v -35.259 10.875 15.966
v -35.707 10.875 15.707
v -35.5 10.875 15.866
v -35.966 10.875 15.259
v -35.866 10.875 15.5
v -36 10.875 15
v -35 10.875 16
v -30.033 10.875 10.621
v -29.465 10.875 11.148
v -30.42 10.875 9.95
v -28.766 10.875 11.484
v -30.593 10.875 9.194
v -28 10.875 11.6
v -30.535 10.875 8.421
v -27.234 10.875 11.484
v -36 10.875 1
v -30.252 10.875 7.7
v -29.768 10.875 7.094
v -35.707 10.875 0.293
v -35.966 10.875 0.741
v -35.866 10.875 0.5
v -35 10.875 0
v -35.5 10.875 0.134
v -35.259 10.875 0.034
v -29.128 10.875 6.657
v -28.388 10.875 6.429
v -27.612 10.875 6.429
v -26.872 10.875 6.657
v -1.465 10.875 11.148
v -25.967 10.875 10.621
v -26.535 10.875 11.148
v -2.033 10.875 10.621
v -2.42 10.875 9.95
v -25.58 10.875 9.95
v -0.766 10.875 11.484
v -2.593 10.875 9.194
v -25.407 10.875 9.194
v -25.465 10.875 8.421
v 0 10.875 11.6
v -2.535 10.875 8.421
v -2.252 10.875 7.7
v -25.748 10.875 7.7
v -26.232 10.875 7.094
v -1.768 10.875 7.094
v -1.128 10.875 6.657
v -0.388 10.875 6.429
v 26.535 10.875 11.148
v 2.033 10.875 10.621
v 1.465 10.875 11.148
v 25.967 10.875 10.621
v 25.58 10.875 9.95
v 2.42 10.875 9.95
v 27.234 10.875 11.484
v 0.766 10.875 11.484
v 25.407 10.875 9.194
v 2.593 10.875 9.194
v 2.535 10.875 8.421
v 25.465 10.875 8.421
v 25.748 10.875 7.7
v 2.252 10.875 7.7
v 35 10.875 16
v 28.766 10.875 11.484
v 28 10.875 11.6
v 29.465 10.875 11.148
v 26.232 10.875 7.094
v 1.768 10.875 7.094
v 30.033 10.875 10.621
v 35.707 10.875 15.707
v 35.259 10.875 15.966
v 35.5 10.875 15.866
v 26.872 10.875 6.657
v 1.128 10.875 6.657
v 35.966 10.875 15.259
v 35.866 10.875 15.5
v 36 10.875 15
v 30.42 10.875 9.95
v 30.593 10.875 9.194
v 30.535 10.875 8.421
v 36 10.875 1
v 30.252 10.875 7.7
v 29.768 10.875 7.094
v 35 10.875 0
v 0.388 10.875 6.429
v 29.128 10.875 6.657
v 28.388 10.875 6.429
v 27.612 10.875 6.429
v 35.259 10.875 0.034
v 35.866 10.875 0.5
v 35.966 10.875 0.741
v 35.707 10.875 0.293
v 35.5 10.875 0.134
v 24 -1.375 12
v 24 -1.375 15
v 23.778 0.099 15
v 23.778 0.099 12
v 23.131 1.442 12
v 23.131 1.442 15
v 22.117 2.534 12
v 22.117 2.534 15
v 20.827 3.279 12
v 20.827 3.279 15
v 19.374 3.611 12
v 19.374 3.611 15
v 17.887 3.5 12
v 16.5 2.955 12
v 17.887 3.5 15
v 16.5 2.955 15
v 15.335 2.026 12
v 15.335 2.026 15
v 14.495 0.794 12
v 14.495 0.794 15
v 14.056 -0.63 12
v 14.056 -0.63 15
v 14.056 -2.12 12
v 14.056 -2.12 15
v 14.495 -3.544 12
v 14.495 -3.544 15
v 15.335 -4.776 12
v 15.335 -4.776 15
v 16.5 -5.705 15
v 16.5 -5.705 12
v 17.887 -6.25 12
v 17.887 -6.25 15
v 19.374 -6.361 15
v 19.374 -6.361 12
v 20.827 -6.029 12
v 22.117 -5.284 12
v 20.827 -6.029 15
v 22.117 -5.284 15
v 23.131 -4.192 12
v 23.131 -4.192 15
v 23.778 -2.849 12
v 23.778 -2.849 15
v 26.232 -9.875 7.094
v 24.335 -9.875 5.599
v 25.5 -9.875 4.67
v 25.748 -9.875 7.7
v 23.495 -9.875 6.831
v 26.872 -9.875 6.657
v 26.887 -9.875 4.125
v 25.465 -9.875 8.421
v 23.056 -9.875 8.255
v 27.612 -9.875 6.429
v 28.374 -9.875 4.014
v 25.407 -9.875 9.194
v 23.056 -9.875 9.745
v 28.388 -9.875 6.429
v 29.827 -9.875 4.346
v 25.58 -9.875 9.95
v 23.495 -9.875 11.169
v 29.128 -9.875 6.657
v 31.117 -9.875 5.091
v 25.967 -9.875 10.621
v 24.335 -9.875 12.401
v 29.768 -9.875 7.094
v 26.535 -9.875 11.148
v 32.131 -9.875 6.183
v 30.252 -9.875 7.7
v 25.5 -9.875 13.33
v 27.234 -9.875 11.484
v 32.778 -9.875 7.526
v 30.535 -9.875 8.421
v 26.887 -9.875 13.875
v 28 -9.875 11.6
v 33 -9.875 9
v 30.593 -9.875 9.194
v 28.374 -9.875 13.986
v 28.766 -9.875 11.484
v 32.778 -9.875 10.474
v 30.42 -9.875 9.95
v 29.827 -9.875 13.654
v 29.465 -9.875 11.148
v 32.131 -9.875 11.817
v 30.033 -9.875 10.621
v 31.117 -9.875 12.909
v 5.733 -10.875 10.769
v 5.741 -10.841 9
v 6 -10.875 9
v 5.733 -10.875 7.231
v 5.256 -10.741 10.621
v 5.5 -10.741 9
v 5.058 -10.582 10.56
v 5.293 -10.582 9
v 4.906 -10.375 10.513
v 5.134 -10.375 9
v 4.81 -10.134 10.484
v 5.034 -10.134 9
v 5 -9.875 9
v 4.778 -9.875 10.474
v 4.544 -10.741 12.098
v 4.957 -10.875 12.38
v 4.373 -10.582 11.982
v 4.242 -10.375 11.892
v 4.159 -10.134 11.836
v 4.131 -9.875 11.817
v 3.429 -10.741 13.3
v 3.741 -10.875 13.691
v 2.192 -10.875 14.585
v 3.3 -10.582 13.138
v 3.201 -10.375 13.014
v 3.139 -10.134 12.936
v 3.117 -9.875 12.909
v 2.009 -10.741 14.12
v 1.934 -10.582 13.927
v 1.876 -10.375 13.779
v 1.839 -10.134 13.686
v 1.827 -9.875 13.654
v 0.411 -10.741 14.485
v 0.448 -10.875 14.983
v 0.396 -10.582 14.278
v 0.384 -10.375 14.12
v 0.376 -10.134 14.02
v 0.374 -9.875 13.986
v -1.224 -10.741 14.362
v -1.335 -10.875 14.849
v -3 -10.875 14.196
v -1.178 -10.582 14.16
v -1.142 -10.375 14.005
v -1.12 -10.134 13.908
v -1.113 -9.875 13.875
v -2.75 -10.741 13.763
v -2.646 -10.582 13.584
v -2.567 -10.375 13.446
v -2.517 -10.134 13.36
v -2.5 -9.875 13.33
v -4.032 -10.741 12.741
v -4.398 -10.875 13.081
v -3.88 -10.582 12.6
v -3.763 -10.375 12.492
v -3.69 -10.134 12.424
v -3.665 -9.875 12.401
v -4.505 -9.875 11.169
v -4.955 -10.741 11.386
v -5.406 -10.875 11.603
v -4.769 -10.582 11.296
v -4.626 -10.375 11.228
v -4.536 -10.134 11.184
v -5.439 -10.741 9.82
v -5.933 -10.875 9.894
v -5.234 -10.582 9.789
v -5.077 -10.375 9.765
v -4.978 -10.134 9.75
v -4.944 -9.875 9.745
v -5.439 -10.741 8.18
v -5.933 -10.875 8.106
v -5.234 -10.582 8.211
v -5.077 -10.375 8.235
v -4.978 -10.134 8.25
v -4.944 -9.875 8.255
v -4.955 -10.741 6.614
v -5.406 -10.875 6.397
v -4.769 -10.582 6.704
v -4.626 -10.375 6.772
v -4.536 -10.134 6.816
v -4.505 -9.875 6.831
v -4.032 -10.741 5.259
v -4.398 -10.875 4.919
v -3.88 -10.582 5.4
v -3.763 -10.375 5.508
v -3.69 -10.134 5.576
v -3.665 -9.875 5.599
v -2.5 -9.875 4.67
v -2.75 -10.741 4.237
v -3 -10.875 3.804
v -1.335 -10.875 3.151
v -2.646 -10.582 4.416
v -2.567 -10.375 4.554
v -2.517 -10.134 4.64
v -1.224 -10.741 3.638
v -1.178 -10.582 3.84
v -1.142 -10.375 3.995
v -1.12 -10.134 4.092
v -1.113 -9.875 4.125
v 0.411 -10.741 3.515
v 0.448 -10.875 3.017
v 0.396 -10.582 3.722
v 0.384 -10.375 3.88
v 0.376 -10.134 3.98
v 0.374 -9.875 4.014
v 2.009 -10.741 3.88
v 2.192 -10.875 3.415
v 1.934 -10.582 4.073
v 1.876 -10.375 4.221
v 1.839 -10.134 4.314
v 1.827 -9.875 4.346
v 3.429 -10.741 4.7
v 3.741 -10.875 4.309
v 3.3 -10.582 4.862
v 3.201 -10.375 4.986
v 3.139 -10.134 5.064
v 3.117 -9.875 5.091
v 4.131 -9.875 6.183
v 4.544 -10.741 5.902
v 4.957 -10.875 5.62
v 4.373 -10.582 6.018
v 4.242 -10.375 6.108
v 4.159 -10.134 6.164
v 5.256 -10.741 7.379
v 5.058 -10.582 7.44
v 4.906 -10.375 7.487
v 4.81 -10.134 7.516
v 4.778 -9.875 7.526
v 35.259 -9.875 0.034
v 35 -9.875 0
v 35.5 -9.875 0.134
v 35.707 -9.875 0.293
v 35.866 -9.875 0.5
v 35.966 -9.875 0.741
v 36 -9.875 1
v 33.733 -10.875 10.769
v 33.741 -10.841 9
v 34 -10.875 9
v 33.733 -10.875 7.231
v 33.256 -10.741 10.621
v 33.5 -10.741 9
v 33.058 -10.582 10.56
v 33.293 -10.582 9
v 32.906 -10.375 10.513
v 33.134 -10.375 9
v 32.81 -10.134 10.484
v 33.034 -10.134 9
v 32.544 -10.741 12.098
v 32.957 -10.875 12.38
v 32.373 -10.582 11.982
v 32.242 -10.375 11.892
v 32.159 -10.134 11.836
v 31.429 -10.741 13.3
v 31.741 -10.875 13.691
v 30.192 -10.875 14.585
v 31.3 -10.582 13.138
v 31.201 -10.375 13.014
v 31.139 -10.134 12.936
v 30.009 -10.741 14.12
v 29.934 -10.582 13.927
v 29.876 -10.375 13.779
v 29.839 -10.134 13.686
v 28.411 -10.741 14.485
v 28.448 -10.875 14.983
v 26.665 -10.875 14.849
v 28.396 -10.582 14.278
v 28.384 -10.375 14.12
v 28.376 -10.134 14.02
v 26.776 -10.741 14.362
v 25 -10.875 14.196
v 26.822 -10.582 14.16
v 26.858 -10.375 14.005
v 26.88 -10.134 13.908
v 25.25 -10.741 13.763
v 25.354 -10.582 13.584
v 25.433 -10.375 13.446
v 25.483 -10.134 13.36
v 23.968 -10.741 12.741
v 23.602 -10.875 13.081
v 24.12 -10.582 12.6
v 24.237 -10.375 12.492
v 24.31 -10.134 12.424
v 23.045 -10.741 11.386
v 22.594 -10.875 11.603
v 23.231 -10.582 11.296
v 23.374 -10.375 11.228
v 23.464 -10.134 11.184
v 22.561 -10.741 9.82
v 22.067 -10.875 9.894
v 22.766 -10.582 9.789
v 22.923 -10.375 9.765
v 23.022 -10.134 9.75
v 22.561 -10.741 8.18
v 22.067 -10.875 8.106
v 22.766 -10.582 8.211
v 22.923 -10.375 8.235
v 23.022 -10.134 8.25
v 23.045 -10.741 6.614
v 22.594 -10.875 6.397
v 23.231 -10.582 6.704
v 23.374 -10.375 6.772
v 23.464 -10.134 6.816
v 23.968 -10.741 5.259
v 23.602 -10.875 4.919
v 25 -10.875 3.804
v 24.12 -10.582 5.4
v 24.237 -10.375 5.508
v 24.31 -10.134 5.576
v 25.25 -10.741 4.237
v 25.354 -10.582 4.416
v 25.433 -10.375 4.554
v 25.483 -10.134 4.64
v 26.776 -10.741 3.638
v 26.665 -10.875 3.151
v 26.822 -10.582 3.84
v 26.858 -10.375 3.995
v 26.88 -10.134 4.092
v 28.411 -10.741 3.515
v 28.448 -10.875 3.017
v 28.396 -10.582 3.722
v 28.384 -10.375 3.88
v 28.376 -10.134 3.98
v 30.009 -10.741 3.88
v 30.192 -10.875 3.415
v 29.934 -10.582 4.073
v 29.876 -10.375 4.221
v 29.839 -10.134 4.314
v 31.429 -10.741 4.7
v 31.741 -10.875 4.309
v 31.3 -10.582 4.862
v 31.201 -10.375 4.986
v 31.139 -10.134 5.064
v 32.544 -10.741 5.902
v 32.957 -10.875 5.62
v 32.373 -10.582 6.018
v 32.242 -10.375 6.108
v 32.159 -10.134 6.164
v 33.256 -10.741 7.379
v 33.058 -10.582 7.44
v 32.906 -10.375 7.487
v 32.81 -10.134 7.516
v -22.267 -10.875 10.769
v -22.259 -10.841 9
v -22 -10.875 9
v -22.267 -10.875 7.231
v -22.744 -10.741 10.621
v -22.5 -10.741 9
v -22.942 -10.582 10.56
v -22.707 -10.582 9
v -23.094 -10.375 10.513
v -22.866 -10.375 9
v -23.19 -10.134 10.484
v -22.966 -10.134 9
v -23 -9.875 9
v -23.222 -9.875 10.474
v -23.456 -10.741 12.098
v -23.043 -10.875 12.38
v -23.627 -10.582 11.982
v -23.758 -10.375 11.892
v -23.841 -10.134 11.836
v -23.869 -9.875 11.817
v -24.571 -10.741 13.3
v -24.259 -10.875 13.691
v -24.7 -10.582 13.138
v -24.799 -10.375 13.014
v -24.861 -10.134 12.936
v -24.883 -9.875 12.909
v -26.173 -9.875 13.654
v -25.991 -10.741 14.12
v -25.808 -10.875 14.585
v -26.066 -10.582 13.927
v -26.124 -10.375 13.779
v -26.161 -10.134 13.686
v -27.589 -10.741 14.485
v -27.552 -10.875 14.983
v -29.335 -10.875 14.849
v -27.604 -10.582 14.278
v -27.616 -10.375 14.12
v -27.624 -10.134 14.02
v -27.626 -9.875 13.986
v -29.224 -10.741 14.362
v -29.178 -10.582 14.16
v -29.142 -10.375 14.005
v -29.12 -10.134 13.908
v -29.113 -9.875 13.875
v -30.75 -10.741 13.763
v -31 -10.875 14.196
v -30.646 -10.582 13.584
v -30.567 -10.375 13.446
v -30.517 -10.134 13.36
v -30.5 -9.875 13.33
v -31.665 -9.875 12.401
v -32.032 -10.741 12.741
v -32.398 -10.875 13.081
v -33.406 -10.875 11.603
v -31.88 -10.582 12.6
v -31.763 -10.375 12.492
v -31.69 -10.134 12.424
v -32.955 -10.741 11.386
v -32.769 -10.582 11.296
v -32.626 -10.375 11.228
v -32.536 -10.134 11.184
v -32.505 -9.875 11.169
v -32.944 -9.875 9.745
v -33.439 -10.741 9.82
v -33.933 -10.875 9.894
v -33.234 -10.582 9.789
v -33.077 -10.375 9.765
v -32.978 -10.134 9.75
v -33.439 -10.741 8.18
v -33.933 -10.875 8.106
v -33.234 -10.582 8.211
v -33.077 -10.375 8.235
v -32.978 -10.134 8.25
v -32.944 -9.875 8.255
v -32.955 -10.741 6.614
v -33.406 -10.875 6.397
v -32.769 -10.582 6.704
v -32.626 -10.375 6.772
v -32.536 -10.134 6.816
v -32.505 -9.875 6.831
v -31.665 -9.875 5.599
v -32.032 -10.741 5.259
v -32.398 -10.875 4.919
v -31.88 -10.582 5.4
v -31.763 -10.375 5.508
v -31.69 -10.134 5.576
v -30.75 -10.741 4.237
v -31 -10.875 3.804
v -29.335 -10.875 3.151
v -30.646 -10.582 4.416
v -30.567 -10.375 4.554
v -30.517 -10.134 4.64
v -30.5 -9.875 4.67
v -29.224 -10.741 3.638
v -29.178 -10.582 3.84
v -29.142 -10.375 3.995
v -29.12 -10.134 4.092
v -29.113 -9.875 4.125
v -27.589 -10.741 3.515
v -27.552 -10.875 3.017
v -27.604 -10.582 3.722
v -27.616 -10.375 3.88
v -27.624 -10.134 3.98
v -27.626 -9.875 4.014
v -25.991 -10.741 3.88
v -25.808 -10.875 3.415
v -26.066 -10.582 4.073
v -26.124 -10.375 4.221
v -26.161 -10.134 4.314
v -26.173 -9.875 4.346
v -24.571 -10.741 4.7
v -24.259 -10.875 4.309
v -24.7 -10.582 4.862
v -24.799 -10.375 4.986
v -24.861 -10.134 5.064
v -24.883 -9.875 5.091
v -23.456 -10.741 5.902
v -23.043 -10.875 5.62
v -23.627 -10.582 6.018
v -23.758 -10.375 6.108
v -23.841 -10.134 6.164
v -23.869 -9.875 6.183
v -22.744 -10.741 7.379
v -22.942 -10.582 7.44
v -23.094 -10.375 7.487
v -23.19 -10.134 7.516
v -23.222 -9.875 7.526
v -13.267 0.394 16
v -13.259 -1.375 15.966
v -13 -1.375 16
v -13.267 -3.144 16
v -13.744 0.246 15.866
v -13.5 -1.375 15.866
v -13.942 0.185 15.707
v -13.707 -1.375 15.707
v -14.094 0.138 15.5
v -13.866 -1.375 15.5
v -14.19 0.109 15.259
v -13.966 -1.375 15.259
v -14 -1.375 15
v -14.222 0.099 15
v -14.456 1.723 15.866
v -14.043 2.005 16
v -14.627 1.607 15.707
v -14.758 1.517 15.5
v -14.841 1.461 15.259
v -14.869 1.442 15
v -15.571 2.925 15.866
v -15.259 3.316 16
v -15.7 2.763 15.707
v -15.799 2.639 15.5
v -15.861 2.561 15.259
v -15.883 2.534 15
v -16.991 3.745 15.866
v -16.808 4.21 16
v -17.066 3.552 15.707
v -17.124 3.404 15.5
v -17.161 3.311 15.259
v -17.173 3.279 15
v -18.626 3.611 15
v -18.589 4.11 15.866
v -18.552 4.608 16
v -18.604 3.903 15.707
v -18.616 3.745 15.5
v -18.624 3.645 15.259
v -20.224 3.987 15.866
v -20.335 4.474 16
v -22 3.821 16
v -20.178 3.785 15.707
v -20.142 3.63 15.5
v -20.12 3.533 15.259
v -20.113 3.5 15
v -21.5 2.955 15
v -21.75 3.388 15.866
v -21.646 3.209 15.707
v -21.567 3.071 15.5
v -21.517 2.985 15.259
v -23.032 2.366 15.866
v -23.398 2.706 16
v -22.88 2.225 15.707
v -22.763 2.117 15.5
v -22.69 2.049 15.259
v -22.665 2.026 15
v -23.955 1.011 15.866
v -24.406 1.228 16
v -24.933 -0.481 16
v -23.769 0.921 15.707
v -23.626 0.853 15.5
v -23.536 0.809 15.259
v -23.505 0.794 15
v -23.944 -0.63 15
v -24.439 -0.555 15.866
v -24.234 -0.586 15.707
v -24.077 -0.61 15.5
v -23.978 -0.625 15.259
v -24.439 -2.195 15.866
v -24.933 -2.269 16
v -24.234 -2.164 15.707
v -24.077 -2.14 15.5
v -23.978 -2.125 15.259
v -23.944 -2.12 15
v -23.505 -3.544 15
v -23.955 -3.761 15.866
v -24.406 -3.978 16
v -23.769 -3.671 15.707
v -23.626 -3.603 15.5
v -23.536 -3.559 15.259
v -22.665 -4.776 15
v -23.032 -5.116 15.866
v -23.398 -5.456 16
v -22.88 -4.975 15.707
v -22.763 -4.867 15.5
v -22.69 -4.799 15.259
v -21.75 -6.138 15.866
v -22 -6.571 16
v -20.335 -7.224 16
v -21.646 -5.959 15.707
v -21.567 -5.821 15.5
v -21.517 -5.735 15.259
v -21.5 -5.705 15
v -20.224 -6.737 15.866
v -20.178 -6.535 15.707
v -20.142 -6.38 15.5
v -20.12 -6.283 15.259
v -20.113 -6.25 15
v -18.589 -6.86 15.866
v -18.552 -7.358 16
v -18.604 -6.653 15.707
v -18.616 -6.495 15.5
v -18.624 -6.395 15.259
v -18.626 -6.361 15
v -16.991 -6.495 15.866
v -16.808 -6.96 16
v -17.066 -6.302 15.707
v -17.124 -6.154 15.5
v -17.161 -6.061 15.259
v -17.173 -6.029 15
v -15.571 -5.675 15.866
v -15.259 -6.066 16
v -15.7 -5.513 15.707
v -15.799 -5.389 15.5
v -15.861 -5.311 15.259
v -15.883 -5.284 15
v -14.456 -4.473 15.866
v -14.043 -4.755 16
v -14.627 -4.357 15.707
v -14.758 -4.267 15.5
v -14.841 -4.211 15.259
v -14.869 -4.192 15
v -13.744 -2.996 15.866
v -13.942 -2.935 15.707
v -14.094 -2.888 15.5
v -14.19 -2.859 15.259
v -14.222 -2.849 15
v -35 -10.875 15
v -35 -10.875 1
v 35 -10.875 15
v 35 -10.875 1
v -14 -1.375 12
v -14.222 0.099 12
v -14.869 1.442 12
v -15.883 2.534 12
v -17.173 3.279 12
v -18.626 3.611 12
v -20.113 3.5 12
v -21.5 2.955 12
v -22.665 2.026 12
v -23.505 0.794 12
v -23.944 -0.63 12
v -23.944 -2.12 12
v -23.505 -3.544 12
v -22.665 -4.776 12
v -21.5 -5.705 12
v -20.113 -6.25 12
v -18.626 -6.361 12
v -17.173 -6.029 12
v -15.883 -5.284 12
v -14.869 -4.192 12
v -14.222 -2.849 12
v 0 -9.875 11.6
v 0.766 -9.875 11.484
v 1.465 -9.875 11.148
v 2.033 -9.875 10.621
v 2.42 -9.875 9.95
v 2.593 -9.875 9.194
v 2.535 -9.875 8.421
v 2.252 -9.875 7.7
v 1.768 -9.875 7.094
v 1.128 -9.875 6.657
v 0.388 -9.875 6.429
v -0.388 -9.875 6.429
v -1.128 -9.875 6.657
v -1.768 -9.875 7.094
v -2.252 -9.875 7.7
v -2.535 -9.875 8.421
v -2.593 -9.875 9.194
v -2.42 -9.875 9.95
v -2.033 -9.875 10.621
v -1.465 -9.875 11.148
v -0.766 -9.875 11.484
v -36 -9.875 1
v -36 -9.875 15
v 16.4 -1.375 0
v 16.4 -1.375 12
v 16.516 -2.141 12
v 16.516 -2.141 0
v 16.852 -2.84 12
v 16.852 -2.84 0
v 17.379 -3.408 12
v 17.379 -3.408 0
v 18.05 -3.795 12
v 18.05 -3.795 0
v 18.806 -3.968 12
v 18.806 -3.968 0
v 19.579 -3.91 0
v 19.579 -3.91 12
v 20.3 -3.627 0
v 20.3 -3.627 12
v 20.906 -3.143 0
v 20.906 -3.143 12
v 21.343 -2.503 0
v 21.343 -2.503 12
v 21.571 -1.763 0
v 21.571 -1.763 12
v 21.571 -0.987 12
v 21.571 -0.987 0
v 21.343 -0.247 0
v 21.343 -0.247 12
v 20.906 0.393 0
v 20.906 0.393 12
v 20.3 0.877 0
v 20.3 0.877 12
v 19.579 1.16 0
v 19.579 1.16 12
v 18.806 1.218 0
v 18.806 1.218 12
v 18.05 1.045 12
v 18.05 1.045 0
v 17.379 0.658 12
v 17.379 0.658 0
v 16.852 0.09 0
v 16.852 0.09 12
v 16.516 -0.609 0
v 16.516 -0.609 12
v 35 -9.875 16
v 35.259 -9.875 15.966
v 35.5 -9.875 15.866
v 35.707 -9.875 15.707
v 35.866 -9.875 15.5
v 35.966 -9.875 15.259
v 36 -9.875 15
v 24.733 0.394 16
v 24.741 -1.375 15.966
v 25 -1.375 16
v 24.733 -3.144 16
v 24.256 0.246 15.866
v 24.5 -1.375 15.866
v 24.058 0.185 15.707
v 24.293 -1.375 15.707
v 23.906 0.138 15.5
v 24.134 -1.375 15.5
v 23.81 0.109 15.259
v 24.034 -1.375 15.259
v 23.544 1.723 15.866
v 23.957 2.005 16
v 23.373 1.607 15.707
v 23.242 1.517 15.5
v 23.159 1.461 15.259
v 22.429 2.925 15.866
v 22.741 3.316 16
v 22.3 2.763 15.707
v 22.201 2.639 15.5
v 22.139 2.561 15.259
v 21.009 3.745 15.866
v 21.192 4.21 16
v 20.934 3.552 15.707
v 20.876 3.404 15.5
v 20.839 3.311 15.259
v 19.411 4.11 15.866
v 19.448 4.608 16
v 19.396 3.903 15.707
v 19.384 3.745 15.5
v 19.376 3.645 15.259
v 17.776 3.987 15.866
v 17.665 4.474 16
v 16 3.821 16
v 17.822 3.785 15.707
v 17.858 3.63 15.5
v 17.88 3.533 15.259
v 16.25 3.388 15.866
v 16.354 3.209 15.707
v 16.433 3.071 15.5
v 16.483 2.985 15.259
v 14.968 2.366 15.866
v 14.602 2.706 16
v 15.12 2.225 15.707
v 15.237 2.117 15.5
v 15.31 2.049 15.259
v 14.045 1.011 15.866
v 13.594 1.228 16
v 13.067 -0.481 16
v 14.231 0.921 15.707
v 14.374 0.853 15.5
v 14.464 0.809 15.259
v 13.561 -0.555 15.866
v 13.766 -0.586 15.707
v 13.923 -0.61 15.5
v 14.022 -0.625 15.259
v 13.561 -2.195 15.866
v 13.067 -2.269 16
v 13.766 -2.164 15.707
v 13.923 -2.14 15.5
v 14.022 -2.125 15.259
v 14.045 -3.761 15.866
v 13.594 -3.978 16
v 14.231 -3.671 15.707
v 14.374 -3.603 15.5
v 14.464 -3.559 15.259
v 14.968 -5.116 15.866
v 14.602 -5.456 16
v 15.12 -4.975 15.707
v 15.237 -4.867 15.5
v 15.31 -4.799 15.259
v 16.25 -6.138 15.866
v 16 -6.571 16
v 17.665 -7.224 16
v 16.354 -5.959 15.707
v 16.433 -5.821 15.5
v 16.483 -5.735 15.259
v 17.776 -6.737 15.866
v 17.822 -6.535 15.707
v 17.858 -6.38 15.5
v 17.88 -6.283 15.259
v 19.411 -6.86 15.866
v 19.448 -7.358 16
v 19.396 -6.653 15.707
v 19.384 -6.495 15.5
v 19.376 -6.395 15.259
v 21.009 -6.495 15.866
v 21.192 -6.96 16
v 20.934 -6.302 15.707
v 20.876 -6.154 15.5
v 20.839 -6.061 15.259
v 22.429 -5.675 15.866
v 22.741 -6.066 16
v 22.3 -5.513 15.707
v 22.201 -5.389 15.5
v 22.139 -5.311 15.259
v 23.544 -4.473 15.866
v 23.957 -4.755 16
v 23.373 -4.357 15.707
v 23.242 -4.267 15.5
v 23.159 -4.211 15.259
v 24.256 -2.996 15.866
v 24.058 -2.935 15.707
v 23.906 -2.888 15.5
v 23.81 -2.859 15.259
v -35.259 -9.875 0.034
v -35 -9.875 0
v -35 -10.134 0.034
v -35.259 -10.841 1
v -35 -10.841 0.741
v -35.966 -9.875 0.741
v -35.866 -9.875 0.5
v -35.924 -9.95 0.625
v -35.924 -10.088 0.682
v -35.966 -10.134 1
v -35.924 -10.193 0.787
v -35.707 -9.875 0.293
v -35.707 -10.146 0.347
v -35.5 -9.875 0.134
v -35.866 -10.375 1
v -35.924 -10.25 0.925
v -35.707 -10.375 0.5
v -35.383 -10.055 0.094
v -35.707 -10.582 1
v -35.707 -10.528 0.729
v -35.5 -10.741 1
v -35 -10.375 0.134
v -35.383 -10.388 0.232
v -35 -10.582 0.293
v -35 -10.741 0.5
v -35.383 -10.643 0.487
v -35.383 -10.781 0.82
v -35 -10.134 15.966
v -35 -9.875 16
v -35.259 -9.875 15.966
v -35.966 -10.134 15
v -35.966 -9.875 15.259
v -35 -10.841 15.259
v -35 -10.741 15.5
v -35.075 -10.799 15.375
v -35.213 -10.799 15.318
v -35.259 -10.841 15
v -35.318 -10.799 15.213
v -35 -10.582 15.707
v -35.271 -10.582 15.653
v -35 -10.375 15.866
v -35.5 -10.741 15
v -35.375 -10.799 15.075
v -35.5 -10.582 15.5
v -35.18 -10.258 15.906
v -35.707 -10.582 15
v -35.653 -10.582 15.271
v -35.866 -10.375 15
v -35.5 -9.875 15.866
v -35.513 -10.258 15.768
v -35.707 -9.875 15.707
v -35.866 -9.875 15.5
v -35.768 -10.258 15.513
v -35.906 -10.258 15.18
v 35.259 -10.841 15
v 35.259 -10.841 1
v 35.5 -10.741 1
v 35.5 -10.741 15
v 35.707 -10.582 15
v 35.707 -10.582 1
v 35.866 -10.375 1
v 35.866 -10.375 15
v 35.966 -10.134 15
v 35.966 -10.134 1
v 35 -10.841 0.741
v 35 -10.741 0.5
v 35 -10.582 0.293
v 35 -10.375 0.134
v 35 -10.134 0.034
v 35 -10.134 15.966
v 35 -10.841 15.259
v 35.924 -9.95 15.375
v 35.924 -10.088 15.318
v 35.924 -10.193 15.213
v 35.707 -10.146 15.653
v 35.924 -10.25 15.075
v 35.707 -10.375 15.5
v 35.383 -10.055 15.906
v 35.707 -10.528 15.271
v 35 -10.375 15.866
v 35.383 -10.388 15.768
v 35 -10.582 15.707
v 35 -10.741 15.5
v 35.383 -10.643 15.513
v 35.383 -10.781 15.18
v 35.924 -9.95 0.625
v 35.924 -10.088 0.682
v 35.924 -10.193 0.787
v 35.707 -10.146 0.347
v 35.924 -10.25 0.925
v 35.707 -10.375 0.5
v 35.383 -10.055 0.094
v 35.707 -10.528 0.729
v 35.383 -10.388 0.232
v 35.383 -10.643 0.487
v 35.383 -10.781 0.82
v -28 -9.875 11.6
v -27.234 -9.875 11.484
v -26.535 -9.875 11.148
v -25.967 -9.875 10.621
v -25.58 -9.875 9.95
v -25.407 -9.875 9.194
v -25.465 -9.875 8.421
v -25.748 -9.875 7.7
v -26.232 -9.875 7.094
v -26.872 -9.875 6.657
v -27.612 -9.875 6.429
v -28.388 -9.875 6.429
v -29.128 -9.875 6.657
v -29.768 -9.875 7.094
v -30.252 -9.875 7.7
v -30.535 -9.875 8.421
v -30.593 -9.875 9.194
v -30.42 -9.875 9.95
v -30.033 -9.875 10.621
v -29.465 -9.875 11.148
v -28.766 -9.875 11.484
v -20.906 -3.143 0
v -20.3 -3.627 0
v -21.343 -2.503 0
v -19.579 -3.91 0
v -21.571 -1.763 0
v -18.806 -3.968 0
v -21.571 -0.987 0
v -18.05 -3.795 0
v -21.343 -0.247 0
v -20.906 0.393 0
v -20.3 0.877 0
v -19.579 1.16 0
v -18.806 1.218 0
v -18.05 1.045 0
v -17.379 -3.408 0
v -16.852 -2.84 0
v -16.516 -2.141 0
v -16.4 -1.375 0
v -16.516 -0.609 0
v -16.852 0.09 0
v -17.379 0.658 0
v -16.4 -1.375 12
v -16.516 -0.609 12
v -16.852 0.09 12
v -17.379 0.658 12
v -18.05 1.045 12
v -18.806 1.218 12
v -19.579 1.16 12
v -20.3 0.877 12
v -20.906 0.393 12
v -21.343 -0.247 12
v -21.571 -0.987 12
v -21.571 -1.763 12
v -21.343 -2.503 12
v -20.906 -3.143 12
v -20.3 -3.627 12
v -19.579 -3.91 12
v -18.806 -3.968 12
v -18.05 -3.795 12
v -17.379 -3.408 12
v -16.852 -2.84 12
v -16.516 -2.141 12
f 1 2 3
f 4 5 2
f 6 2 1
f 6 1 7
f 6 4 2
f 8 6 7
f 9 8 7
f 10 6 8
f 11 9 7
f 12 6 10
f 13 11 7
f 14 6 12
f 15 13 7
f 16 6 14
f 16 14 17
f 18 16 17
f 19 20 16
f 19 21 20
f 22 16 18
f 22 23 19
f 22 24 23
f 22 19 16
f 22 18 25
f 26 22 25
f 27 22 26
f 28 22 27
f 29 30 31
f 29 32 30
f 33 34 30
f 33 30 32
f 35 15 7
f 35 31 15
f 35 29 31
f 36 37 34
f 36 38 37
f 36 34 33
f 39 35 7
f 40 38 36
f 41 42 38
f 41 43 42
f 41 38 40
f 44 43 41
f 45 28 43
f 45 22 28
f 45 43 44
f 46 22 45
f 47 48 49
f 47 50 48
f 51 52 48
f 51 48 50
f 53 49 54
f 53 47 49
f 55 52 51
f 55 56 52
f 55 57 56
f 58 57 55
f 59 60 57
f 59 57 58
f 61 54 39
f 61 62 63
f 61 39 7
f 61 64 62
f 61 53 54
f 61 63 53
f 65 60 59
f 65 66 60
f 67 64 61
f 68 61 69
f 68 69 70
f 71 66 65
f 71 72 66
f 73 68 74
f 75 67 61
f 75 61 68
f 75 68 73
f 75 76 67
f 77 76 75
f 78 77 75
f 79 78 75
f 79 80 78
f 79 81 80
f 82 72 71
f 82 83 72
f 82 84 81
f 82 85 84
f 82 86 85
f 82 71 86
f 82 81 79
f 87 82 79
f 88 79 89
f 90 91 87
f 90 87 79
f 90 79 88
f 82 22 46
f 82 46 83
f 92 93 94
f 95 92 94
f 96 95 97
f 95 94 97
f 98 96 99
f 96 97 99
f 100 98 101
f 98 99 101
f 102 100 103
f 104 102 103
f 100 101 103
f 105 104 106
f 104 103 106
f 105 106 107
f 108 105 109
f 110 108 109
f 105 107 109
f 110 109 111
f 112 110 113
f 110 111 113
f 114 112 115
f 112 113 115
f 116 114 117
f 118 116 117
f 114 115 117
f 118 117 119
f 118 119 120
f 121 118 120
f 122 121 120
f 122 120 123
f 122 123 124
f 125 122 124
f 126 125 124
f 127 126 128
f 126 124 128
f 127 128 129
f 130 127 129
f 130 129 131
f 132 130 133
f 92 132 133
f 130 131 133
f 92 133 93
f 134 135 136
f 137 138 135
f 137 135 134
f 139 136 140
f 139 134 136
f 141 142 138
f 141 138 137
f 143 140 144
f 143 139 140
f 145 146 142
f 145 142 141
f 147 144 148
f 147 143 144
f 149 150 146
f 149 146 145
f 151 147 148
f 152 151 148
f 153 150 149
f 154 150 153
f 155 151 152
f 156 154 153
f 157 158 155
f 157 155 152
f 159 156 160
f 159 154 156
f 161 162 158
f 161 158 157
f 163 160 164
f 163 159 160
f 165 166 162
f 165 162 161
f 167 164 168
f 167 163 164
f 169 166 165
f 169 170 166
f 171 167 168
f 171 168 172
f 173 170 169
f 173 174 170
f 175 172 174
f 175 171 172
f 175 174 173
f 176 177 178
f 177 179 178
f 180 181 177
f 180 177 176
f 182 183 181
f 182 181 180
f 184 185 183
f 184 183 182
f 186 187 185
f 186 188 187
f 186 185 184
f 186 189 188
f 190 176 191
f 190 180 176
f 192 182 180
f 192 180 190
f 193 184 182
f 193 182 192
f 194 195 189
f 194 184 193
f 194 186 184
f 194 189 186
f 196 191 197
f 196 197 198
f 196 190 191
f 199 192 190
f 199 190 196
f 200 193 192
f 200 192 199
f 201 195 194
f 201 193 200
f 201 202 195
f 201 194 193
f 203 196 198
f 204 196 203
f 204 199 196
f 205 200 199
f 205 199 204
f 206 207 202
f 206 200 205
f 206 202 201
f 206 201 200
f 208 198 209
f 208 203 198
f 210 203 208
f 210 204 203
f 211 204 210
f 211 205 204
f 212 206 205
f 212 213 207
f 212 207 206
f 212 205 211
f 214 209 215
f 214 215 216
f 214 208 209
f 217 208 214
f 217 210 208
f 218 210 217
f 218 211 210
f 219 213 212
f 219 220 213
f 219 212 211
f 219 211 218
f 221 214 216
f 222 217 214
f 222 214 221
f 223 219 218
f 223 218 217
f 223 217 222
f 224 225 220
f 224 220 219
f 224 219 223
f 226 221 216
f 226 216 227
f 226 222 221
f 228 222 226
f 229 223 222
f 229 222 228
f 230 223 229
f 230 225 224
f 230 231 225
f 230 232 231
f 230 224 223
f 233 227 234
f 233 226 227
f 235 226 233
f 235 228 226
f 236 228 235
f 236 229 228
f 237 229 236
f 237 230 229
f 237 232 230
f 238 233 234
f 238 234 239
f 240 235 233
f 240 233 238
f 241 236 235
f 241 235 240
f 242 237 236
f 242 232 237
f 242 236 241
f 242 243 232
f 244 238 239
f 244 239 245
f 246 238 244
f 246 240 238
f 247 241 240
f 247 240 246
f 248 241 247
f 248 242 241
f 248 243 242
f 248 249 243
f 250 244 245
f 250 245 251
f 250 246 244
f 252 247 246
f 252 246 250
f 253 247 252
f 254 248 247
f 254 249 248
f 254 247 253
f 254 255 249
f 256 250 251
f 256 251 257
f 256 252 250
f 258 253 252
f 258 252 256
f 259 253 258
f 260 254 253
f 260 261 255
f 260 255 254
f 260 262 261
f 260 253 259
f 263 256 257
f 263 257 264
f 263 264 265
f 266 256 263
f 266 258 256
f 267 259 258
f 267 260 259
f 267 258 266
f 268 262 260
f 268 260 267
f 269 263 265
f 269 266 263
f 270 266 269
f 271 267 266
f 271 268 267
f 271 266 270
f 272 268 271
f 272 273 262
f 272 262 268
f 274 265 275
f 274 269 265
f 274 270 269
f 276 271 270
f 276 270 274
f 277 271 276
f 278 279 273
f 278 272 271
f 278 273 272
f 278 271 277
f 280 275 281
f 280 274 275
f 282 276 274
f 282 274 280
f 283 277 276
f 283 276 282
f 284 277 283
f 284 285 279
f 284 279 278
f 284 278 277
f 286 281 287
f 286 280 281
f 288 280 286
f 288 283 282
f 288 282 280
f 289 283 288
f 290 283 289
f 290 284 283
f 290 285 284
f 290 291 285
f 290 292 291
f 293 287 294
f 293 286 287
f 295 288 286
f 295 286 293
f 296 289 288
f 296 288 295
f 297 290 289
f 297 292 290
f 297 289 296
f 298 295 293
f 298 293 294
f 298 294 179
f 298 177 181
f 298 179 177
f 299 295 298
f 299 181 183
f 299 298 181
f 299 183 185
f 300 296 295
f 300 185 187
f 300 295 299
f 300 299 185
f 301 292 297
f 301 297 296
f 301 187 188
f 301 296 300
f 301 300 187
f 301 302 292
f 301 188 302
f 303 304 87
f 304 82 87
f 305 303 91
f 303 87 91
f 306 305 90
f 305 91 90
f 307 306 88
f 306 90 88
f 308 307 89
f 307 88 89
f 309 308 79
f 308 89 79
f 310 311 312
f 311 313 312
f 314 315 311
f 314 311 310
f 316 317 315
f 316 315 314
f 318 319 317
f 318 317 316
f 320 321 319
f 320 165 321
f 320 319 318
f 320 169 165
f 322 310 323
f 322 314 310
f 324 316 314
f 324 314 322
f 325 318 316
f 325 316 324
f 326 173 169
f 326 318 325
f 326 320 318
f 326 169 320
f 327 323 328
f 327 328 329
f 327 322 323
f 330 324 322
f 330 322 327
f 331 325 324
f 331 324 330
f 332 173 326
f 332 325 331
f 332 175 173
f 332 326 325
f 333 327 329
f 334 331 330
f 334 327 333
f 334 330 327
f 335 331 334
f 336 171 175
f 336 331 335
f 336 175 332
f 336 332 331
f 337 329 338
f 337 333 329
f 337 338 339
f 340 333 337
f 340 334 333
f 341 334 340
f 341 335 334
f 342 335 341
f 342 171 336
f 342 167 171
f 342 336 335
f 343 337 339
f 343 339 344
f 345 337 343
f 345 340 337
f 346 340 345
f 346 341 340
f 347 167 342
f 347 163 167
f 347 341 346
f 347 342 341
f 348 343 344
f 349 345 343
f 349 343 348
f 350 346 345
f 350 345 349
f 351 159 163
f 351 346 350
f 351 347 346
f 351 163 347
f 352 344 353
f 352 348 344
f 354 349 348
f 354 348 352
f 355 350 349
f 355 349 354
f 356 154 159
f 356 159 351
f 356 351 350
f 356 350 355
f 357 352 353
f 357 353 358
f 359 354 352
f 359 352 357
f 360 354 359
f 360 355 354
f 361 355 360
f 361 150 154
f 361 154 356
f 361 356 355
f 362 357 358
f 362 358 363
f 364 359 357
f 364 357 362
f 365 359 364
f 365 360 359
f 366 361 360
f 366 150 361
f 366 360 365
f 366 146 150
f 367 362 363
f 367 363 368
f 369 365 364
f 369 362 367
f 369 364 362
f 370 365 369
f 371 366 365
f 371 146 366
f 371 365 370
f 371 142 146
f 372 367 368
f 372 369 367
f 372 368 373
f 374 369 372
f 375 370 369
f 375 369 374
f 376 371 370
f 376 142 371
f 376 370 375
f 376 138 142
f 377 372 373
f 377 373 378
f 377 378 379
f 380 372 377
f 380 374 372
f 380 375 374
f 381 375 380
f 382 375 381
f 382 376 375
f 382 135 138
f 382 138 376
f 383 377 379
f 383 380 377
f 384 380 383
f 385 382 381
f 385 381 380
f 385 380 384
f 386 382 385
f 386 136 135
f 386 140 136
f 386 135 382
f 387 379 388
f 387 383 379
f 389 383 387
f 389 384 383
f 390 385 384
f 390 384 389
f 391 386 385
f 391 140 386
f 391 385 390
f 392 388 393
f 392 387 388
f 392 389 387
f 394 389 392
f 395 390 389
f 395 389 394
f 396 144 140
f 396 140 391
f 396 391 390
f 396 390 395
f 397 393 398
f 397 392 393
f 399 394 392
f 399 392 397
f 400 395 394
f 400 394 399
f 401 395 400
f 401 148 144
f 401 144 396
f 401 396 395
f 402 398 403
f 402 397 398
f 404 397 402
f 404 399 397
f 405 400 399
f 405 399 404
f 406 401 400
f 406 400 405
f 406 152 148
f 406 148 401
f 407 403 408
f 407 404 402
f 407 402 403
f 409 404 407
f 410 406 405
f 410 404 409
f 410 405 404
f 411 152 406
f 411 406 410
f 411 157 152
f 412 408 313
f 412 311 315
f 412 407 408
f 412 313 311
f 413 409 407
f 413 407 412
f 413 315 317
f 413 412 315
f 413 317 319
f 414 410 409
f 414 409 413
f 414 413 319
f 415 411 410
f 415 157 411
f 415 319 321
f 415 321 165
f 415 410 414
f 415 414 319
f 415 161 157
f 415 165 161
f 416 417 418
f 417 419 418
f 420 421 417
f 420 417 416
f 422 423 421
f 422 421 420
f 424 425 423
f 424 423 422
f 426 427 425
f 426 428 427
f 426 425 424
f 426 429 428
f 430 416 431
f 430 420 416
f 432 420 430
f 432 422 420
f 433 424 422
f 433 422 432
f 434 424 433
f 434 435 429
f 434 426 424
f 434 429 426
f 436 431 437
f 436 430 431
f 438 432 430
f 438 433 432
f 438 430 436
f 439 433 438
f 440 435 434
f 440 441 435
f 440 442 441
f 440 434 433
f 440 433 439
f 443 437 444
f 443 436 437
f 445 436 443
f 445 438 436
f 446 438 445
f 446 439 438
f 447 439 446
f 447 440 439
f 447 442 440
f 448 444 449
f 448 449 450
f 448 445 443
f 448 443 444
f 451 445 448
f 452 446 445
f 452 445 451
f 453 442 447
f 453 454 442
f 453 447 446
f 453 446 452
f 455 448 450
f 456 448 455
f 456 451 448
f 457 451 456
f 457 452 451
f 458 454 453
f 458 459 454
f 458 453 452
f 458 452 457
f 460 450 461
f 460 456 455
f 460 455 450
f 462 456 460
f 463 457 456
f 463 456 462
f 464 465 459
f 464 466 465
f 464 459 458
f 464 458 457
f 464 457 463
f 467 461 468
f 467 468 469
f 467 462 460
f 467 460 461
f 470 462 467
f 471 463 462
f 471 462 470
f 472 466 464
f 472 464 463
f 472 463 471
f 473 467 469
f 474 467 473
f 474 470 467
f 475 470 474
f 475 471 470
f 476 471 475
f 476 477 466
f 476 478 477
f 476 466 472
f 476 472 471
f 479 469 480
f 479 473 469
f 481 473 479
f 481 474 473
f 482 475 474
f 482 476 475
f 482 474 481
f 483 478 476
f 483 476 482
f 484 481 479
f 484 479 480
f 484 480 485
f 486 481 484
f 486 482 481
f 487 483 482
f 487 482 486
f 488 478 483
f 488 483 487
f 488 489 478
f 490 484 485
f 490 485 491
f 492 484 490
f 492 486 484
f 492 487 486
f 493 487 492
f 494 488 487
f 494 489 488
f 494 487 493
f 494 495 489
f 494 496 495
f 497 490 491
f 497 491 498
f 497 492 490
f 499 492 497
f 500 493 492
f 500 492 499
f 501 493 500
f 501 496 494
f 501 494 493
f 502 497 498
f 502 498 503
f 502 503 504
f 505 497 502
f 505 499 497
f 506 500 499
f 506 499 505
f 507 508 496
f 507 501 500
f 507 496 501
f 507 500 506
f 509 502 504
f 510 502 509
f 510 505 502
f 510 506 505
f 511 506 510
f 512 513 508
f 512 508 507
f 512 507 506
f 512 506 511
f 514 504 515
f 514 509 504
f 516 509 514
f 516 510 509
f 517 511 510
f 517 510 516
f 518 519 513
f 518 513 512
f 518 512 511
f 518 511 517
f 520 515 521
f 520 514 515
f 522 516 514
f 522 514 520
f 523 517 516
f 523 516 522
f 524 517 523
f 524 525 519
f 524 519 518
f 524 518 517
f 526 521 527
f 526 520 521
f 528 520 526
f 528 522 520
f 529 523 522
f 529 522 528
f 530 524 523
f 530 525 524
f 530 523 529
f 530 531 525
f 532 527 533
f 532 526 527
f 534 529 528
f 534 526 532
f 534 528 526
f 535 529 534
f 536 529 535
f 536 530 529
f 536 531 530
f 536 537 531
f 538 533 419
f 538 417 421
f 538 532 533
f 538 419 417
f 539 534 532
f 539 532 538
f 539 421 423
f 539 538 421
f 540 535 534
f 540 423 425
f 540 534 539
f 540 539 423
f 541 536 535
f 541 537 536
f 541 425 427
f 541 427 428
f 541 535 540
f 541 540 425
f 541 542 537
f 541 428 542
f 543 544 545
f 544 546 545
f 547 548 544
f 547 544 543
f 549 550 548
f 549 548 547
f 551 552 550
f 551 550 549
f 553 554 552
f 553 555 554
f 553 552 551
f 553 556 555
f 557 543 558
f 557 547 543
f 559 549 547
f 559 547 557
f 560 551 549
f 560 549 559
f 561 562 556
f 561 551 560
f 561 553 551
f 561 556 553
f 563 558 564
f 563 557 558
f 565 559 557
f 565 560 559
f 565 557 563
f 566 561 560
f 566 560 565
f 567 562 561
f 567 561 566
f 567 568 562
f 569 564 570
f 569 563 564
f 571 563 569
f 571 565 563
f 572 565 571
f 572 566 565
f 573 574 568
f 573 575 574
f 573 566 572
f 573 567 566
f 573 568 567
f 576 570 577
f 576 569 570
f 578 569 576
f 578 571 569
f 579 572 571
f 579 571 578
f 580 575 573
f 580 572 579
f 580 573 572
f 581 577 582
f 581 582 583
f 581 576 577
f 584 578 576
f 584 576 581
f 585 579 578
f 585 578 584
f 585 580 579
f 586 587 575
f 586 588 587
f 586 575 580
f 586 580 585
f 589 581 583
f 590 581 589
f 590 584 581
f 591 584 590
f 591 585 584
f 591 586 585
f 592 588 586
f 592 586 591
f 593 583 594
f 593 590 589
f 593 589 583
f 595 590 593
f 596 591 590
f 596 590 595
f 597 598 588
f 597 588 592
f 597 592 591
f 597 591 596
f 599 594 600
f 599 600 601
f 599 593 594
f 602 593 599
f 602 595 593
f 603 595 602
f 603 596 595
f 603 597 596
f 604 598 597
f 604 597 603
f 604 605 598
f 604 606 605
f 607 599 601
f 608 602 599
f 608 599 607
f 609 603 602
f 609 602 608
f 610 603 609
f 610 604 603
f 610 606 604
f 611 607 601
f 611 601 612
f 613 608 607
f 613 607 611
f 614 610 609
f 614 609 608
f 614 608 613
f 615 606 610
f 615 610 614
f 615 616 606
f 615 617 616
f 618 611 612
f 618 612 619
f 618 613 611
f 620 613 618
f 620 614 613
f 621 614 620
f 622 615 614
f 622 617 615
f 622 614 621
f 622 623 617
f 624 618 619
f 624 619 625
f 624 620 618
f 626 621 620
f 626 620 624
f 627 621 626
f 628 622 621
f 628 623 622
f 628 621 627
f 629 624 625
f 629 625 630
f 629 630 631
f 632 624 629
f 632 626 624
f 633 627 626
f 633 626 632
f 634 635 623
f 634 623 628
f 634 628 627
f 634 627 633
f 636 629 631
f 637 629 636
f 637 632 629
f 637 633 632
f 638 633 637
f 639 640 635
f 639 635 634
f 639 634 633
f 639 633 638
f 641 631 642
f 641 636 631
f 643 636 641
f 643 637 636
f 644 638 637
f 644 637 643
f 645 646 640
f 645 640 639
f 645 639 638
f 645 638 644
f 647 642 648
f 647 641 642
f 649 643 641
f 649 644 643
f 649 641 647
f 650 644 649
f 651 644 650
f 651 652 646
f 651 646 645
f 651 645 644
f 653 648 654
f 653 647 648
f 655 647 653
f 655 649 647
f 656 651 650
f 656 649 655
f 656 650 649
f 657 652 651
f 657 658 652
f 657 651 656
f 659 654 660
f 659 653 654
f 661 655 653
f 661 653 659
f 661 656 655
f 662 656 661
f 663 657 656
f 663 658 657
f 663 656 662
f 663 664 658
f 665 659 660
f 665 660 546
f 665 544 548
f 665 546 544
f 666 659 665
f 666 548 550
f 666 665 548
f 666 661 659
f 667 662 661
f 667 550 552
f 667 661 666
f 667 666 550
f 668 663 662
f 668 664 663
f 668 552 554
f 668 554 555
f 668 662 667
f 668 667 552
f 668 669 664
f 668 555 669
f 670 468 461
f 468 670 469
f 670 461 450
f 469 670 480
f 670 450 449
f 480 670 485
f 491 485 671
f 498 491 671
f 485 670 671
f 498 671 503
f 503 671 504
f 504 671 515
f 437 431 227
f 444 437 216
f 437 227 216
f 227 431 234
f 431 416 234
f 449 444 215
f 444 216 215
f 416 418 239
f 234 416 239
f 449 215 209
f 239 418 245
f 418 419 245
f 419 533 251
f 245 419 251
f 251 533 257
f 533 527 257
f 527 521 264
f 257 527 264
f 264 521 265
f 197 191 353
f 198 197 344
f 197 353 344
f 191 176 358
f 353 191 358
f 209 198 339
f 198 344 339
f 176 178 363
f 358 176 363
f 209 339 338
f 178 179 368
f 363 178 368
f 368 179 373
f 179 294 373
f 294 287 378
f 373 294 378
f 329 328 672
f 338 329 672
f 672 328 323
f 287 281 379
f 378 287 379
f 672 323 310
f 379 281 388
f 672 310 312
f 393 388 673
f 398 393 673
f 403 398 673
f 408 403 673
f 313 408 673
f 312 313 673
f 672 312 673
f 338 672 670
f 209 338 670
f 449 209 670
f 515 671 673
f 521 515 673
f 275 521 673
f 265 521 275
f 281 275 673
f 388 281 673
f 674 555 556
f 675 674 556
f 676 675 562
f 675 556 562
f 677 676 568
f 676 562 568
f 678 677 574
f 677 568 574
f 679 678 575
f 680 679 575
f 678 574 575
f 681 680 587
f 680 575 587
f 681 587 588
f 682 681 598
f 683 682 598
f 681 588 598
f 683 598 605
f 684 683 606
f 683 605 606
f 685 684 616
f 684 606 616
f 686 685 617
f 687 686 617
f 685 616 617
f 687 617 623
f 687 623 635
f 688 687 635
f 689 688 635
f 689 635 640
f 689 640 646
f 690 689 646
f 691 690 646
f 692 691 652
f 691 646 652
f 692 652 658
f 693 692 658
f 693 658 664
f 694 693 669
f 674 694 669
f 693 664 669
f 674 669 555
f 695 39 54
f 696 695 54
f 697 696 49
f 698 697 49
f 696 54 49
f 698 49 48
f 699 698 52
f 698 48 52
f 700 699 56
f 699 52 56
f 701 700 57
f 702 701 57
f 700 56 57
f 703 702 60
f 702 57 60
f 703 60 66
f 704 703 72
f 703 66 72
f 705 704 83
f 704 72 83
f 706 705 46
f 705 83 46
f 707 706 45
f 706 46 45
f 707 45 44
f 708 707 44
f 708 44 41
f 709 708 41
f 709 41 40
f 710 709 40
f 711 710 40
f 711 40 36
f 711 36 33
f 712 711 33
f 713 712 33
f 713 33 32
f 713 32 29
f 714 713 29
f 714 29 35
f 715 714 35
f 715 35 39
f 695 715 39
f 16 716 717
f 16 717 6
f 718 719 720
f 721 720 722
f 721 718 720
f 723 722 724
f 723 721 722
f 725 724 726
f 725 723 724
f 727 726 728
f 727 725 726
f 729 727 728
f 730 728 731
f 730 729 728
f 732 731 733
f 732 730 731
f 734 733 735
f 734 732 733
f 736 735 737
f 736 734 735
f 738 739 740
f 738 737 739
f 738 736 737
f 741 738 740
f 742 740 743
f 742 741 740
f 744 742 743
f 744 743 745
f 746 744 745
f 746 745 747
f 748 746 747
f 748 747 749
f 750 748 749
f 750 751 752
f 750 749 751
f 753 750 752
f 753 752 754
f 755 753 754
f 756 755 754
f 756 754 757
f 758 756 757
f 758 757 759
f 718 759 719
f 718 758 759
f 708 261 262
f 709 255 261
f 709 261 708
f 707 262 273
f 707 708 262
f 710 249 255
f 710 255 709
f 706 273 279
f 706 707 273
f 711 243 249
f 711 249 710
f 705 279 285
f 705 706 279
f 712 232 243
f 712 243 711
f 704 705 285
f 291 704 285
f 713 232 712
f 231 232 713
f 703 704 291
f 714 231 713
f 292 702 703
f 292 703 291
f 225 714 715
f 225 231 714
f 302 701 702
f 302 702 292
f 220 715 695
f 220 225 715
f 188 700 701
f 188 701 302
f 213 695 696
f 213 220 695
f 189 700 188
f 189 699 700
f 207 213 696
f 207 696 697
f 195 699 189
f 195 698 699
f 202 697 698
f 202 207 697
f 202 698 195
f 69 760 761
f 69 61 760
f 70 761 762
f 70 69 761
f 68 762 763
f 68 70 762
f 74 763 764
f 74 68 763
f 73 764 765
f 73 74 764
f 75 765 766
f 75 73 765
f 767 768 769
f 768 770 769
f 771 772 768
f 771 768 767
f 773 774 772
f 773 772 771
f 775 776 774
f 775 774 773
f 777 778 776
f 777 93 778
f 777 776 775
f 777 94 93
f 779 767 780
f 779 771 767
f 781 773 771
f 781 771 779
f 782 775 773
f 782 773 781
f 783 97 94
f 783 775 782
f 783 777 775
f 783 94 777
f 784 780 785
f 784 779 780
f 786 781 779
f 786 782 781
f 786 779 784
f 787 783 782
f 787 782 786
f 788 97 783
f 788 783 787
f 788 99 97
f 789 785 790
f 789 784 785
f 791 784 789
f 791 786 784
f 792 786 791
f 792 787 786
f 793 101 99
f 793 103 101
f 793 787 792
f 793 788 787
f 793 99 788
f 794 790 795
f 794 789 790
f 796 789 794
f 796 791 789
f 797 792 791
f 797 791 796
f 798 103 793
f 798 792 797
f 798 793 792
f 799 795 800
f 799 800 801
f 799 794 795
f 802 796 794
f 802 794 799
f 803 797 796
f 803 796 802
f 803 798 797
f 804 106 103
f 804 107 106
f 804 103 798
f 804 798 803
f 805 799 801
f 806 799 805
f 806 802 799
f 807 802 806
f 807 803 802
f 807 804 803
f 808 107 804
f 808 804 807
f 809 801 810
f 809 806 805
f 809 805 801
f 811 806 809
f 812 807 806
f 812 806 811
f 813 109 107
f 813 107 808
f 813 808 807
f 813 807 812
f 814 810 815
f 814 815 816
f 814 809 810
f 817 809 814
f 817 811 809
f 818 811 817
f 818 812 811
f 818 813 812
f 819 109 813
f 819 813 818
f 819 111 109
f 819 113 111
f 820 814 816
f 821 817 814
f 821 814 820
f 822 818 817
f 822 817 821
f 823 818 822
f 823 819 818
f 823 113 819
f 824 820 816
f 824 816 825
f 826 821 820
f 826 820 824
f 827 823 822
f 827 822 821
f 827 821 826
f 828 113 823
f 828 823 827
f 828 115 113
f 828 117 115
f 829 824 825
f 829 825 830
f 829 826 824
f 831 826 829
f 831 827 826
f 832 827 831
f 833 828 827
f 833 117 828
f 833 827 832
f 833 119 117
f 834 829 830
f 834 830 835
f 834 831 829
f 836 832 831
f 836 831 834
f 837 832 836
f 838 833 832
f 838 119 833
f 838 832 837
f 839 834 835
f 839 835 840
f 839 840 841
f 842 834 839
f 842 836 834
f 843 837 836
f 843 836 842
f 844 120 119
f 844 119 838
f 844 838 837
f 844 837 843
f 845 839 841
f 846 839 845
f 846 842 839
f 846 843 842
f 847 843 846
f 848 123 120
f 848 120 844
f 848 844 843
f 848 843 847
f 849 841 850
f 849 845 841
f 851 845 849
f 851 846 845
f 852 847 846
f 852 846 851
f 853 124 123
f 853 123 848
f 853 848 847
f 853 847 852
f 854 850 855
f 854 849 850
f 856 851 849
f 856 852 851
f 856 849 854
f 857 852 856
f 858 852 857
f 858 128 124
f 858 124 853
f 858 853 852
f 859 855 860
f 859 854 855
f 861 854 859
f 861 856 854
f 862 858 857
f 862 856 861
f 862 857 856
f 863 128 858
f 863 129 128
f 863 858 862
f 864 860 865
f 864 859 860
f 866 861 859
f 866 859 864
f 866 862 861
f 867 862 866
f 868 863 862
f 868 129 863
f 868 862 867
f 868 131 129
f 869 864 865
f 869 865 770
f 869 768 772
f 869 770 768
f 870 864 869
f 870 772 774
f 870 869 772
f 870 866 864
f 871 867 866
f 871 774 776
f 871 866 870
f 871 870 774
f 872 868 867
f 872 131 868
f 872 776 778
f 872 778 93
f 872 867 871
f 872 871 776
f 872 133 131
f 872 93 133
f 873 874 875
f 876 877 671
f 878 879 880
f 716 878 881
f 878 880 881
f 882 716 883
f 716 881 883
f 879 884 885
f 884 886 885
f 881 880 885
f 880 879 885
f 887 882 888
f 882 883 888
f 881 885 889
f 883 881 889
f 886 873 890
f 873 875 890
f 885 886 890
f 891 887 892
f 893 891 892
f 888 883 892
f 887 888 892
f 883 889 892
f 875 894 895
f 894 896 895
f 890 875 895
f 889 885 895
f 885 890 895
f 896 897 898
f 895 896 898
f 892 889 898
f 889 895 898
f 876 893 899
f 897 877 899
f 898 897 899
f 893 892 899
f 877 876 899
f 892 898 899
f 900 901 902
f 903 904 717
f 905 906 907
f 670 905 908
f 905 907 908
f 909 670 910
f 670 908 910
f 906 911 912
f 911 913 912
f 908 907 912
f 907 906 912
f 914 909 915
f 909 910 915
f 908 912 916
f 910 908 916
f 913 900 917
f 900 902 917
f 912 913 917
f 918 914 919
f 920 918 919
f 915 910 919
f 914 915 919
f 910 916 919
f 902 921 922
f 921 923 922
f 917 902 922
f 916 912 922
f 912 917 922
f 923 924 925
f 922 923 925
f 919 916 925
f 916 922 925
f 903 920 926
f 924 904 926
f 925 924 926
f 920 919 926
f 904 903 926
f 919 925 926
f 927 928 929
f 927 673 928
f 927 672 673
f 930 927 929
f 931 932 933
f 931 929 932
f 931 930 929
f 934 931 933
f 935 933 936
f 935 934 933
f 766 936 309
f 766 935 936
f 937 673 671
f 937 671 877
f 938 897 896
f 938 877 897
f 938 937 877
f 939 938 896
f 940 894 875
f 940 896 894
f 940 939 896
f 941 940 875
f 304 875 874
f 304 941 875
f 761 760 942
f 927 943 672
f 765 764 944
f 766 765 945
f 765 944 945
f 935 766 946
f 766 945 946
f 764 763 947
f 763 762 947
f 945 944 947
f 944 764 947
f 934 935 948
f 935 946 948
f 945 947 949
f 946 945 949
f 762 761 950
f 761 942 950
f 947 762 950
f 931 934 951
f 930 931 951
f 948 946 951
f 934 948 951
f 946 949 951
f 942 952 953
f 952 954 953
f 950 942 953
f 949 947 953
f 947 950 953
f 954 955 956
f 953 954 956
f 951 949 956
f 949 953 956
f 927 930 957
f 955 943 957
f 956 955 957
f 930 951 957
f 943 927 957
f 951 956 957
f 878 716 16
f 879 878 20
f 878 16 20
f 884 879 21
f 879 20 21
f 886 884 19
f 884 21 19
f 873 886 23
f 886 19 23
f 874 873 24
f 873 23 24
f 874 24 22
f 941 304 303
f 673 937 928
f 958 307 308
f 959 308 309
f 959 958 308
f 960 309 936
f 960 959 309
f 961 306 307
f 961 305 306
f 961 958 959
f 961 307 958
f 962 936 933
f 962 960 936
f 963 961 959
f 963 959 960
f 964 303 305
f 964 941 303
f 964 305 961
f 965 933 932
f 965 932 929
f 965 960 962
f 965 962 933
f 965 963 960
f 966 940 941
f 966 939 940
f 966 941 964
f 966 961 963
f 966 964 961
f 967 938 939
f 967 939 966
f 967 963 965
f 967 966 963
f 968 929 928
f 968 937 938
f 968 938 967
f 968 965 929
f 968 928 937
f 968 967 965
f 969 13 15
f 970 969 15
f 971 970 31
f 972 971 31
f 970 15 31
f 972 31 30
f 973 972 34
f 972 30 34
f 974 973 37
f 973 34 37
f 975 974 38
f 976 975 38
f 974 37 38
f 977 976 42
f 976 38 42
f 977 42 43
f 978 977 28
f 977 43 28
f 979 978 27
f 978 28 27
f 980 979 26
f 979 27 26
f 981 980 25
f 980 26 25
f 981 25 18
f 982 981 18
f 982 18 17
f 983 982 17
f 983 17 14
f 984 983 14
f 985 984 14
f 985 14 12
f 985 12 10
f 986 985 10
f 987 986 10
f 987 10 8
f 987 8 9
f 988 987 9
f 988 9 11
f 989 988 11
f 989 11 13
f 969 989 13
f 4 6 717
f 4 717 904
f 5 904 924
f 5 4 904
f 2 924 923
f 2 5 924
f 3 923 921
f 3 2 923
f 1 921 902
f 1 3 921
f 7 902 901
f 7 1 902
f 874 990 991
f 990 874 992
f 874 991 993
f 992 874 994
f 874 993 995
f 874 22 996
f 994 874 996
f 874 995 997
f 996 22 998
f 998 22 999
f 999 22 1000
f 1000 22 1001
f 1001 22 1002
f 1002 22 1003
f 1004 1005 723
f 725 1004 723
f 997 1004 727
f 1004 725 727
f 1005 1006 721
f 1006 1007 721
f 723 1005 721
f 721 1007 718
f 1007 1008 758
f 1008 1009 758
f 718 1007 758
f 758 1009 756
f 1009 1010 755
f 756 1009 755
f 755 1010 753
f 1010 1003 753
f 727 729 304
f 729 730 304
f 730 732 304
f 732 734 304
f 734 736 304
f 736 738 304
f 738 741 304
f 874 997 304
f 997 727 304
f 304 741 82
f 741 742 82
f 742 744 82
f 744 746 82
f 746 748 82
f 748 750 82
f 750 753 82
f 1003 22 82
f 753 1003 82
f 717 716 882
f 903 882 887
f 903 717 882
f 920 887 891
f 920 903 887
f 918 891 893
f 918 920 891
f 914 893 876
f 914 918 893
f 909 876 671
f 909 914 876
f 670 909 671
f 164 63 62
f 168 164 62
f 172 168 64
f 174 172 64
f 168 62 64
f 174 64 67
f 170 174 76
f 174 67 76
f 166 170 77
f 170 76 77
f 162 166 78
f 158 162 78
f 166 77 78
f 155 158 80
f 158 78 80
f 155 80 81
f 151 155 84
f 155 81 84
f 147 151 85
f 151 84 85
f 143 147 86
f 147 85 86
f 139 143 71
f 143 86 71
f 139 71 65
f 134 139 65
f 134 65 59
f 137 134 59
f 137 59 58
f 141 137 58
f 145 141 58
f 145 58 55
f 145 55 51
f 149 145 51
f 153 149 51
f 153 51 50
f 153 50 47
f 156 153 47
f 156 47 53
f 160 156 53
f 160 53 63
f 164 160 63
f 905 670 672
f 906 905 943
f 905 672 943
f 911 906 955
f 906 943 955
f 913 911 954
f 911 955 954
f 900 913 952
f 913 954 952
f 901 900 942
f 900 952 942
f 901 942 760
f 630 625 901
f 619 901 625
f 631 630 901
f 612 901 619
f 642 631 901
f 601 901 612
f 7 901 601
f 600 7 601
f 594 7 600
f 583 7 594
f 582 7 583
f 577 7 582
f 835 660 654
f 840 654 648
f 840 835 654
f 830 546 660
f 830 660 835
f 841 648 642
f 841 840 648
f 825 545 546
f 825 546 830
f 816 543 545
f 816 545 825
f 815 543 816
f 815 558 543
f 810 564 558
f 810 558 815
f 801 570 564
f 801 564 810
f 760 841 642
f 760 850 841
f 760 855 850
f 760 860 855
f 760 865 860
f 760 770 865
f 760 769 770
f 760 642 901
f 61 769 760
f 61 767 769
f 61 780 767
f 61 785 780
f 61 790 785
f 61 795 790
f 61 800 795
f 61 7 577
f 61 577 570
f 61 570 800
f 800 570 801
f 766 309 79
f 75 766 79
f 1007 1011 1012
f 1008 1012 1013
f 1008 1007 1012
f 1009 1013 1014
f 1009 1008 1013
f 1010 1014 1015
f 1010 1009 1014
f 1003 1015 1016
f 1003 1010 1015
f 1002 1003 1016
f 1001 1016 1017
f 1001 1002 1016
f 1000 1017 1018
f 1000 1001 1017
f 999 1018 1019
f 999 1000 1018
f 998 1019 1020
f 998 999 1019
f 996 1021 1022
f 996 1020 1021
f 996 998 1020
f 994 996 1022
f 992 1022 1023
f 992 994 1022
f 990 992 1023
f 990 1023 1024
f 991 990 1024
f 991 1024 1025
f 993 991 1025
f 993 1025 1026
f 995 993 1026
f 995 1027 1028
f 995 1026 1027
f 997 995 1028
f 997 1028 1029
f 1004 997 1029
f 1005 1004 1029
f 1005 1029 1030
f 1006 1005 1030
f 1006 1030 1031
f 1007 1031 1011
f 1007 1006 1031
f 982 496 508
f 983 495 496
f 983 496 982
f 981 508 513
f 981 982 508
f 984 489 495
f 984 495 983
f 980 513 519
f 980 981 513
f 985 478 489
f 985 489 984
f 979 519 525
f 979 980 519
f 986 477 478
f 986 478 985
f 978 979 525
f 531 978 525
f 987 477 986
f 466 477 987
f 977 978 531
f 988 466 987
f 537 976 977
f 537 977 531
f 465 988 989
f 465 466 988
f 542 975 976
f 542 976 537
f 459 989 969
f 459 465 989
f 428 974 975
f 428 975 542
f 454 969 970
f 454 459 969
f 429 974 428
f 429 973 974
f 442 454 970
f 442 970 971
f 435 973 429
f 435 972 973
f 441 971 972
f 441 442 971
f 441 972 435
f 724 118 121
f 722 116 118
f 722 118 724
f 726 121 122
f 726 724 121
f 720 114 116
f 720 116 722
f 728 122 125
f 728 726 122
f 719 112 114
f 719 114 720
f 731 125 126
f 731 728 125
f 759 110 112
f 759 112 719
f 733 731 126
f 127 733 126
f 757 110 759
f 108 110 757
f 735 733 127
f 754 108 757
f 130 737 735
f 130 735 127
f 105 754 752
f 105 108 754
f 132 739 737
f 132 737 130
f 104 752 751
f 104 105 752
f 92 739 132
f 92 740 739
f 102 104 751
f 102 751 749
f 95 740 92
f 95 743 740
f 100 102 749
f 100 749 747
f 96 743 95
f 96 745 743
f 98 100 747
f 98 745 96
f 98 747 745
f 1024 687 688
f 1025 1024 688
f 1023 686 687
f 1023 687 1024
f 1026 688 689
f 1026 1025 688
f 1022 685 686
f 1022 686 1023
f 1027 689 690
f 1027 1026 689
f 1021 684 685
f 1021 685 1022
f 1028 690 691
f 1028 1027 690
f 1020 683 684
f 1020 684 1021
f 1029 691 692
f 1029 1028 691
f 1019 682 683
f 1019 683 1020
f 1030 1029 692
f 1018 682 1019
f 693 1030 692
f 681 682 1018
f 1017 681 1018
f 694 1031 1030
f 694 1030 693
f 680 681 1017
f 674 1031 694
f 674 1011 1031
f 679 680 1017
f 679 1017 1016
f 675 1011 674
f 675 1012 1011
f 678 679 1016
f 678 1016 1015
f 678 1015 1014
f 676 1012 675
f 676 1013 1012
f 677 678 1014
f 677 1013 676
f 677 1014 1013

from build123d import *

# Parameters (mm, degrees)
SKETCH1_W           = 72
SKETCH1_H           = 21.75
SKETCH1_R           = 2.6
BOSS_EXTRUDE1_DEPTH = 16
SKETCH2_R           = 5
CUT_EXTRUDE1_DEPTH  = 4
SKETCH3_R           = 2.6
CUT_EXTRUDE2_DEPTH  = 21.75
SKETCH4_R           = 5
CUT_EXTRUDE3_DEPTH  = 1
FILLET1_R           = 1


with BuildPart() as part:
    # Sketch1 → Boss-Extrude1 (new body)
    with BuildSketch(Plane.XY):
        Rectangle(SKETCH1_W, SKETCH1_H)
        with Locations((-19, -1.375)):
            Circle(SKETCH1_R, mode=Mode.SUBTRACT)
        with Locations(Location((19, -1.375, 0), (0, 0, 180))):
            Circle(SKETCH1_R, mode=Mode.SUBTRACT)
    extrude(amount=BOSS_EXTRUDE1_DEPTH)

    # Sketch2 → Cut-Extrude1 (cut)
    with BuildSketch(Plane.XY.offset(16)):
        with Locations((-19, -1.375)):
            Circle(SKETCH2_R)
        with Locations((19, -1.375)):
            Circle(SKETCH2_R)
    extrude(amount=-CUT_EXTRUDE1_DEPTH, mode=Mode.SUBTRACT)

    # Sketch3 → Cut-Extrude2 (cut)
    with BuildSketch(Plane(origin=(0, 10.875, 0), x_dir=(1, 0, 0), z_dir=(0, 1, 0))):
        with Locations(Location((0, -9, 0), (0, 0, 270))):
            Circle(SKETCH3_R)
        with Locations(Location((-28, -9, 0), (0, 0, 270))):
            Circle(SKETCH3_R)
        with Locations(Location((28, -9, 0), (0, 0, 270))):
            Circle(SKETCH3_R)
    extrude(amount=-CUT_EXTRUDE2_DEPTH, mode=Mode.SUBTRACT)

    # Sketch4 → Cut-Extrude3 (cut)
    with BuildSketch(Plane.XZ.offset(10.875)):
        with Locations((-28, 9)):
            Circle(SKETCH4_R)
        with Locations((0, 9)):
            Circle(SKETCH4_R)
        with Locations((28, 9)):
            Circle(SKETCH4_R)
    extrude(amount=-CUT_EXTRUDE3_DEPTH, mode=Mode.SUBTRACT)

    # Fillet1
    fillet1_edges = [part.edges().sort_by_distance(p)[0] for p in [
        (-36, 0, 16),
        (0, -10.875, 16),
        (-24, -1.375, 16),
        (14, -1.375, 16),
        (36, 0, 16),
        (0, -10.875, 0),
        (-33, -10.875, 9),
        (-36, 0, 0),
        (-5, -10.875, 9),
        (36, 0, 0),
        (23, -10.875, 9),
        (36, -10.875, 8),
        (-36, -10.875, 8),
    ]]
    fillet(fillet1_edges, radius=FILLET1_R - 0.0001)  # a hair under: the kernel refuses the full size


solid = part.part
